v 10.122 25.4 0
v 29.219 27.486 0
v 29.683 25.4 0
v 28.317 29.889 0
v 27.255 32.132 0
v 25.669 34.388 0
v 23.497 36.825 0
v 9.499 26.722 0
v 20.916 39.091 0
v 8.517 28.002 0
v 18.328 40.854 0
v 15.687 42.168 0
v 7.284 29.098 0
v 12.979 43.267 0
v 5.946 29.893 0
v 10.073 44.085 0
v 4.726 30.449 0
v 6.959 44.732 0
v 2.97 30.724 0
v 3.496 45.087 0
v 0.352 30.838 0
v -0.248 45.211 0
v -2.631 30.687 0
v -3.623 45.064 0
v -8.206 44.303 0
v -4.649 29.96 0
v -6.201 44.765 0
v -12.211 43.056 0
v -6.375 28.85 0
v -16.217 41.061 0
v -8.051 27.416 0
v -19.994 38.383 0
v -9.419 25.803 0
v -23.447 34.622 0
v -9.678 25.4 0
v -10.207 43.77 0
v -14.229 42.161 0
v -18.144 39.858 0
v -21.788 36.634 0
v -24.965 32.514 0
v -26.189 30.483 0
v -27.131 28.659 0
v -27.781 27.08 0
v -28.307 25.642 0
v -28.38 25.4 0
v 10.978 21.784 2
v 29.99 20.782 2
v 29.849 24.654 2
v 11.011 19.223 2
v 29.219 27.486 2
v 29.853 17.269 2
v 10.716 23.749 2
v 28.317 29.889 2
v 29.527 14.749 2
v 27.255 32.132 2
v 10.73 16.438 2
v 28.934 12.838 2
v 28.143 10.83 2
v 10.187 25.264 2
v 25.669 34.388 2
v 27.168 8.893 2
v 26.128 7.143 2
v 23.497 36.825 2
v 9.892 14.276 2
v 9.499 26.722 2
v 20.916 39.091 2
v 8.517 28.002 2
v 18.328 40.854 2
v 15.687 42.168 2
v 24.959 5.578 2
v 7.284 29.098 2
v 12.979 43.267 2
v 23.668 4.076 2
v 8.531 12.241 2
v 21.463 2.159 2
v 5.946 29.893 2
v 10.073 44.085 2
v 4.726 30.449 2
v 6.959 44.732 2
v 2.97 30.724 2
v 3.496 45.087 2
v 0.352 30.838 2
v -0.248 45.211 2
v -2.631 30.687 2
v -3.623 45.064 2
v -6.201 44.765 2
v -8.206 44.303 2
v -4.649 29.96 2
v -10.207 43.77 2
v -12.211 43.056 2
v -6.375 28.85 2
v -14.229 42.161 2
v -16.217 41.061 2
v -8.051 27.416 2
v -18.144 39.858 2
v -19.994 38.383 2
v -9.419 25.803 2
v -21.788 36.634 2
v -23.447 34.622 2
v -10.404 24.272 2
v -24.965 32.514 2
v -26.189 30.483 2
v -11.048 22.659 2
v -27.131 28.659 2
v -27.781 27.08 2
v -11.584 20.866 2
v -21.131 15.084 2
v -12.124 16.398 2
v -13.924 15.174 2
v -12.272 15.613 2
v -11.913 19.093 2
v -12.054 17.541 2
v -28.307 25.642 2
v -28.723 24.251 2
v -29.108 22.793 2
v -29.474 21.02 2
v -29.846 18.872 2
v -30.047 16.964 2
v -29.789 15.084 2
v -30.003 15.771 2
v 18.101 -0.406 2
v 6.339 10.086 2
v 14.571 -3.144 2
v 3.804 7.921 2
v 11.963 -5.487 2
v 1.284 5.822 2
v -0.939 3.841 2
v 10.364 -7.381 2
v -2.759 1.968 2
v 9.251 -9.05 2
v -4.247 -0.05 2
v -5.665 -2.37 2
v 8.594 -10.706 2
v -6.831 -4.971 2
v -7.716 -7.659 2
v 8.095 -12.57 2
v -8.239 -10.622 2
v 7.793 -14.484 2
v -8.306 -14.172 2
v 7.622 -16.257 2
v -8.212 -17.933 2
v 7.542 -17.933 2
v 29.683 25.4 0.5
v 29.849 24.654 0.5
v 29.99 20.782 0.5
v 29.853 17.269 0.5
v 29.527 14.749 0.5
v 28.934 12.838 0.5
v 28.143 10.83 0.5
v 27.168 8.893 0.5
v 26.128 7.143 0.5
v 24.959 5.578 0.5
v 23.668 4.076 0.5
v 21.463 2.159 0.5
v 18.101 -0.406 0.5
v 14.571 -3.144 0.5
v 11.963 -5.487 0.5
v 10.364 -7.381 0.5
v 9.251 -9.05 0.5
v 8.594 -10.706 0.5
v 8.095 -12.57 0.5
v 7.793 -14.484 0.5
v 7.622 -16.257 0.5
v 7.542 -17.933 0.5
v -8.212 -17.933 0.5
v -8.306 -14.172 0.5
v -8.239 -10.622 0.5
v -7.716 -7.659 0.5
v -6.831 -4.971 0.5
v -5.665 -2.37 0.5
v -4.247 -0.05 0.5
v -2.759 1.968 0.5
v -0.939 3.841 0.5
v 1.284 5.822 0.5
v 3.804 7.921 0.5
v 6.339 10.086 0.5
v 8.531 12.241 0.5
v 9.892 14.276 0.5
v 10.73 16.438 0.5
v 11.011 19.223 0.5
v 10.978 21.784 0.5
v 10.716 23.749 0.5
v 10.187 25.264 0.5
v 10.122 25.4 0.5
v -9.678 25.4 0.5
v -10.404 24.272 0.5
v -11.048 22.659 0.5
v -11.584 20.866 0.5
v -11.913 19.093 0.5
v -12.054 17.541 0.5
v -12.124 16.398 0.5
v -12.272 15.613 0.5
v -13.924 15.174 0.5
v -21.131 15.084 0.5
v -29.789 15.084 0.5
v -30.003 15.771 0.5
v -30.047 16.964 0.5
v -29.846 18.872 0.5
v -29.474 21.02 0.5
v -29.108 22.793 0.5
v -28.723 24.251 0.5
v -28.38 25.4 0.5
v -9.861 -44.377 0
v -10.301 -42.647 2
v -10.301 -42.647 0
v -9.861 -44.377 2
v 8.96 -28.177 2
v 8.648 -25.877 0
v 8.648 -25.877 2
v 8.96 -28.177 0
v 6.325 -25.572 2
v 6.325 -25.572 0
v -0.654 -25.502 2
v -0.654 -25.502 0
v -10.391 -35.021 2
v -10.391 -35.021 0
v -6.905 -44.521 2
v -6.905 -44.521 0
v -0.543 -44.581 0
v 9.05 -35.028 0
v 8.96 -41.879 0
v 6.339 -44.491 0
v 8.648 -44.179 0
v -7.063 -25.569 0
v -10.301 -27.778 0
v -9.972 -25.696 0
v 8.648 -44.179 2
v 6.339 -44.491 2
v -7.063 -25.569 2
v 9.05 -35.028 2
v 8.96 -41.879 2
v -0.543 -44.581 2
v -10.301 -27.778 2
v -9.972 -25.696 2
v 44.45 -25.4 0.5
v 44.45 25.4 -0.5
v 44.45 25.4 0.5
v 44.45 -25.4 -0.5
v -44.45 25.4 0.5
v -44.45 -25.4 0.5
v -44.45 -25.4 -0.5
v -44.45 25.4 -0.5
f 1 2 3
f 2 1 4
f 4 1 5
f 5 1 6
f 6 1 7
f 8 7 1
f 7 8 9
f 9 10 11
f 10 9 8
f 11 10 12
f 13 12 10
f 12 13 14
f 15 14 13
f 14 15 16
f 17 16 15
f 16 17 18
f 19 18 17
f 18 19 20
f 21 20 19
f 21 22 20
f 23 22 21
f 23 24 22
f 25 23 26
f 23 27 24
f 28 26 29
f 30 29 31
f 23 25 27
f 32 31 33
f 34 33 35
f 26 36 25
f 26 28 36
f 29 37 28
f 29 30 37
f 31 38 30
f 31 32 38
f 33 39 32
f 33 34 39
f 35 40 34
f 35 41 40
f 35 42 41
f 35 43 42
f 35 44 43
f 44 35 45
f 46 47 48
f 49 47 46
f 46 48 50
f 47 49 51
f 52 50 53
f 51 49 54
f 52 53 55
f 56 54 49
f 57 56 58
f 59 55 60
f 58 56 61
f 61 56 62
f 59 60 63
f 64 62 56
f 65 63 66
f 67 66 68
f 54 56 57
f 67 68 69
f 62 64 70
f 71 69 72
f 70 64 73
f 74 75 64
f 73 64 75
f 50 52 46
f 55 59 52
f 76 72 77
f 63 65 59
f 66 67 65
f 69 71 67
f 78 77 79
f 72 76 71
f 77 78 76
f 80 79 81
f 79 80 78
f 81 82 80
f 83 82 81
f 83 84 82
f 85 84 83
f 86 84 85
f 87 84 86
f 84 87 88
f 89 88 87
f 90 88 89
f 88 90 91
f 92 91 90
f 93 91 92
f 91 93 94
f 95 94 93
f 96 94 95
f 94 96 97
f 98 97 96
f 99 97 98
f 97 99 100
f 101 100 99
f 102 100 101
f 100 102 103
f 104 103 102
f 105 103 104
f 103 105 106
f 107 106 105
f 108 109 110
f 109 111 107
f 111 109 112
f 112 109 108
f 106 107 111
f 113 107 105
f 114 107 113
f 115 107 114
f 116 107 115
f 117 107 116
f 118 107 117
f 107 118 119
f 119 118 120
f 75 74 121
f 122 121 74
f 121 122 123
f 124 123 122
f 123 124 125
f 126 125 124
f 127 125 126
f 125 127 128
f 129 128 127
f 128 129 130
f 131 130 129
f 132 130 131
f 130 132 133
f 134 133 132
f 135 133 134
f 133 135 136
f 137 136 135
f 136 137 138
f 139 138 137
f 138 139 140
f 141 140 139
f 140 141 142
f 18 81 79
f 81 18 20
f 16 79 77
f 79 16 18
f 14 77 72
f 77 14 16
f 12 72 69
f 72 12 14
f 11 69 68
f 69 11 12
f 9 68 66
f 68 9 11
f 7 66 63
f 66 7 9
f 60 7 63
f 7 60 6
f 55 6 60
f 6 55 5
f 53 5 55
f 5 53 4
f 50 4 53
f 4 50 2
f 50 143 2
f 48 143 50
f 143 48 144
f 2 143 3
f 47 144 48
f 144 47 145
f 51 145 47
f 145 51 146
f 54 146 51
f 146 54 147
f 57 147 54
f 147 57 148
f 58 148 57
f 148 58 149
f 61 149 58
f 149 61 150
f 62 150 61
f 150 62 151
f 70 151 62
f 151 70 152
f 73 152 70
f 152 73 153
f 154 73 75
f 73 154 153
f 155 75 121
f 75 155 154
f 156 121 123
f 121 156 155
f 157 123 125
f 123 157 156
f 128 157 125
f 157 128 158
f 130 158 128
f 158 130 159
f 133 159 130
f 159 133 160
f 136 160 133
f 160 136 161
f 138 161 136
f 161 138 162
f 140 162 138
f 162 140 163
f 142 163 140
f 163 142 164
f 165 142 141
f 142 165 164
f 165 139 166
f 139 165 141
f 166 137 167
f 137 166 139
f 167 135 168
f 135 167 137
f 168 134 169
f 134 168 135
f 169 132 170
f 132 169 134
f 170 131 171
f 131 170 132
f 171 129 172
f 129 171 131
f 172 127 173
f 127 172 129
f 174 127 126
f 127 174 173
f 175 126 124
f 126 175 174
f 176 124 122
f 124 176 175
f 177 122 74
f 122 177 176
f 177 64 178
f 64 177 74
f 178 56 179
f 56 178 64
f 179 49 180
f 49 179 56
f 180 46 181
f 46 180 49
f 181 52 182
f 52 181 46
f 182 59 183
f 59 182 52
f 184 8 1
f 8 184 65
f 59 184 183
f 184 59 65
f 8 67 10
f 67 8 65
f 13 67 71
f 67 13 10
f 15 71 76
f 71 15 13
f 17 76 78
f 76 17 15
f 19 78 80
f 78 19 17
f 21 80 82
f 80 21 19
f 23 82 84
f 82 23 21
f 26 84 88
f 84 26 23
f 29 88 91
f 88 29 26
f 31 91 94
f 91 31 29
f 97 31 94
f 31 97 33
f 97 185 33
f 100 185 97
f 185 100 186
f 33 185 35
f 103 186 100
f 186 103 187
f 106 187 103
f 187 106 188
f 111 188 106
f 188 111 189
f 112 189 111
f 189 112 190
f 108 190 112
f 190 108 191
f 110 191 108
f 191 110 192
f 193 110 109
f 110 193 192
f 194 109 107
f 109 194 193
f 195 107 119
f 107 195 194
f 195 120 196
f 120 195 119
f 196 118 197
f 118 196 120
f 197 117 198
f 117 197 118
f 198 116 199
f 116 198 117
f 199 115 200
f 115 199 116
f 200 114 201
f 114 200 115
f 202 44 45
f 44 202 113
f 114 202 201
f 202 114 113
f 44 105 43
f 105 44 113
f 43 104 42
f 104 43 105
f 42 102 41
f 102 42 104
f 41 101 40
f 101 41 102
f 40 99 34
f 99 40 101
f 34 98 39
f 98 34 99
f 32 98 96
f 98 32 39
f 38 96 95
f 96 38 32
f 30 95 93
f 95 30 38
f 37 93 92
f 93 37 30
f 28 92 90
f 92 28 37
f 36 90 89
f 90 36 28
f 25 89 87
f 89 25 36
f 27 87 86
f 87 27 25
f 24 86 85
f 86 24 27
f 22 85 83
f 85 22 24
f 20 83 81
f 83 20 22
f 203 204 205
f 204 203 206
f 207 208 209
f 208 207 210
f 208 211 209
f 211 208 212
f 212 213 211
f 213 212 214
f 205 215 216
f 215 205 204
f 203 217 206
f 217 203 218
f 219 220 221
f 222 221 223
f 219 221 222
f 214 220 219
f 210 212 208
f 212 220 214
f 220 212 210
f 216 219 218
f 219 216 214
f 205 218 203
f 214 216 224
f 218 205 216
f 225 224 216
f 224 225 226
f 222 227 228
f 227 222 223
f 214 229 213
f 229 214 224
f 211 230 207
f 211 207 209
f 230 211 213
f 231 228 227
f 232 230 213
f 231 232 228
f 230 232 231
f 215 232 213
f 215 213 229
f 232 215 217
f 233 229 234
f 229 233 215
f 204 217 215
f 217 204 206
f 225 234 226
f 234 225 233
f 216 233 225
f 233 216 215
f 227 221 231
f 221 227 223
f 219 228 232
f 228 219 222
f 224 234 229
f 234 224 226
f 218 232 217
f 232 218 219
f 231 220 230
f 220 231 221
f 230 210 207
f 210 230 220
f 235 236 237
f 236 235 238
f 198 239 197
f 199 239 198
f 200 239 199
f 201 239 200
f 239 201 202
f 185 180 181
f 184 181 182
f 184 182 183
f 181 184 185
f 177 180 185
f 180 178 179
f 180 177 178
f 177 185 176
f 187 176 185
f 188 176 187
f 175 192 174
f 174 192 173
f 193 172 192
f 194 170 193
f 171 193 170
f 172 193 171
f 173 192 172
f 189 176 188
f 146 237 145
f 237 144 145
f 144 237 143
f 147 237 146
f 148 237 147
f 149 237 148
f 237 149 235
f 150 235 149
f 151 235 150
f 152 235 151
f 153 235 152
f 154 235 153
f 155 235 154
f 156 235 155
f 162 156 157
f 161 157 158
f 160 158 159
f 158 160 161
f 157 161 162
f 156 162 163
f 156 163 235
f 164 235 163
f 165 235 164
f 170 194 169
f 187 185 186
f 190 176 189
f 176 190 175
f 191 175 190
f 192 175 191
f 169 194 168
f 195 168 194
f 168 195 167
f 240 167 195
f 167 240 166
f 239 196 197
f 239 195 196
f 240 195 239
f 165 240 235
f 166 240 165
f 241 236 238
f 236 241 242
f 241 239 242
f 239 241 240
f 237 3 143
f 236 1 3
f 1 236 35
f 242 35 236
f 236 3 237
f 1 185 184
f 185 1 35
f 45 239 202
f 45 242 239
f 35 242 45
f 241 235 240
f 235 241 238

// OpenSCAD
// [FL_INDEX: keywords="openscad, 3d_parametric, Customizable_Business_Card, csg_solid" | COT="Parametric OpenSCAD design from 3DCodeverse"]
// Title: Customizable Business Card

//------------------------------------------------------------
//	
//
//	input comes from:
//	http://chaaawa.com/stencil_factory/
//
//	
//	http://www.thingiverse.com/thing:55821
//------------------------------------------------------------

// preview[view:south, tilt:top]

// Go to: http://chaaawa.com/stencil_factory/, then paste here after "Convert&Copy".
input ="no_input";

stencil_thickness = 1;
stencil_width = 80;
margin = 10;

//If you don't want to center your design on the case
offX = 0;
offY = 0;
image_rotation =0; //[-180:180]

module void() {}

dispo_width = stencil_width - 2*margin;

points_array = (input=="no_input"? [[179,268],[[199.26,15.12],[189.19,15.56],[181.5,16.45],[175.52,17.83],[169.55,19.42],[163.57,21.55],[157.55,24.22],[151.62,27.5],[145.87,31.09],[140.35,35.49],[135,40.71],[130.05,46.71],[125.52,53],[121.87,59.06],[119.06,64.5],[117.12,69.21],[115.55,73.5],[114.31,77.65],[113.16,82],[112.07,87.29],[110.96,93.7],[110.36,99.39],[110.49,102.95],[111.13,105],[136.96,105],[158.46,104.73],[163.39,103.42],[163.83,101.08],[164.04,97.67],[164.46,93.04],[165.44,87.75],[167.04,82.4],[168.96,77.59],[171.9,73.02],[175.98,68.21],[180.98,63.93],[186.13,60.62],[192.15,58.45],[201.05,58],[208.86,58.34],[214.1,59.16],[217.74,60.82],[221.73,63.19],[225.41,66.46],[228.34,70.28],[230.39,74.63],[231.97,79.15],[232.75,85.01],[232.85,92.65],[232.01,100.96],[229.51,107.41],[225.45,113.48],[218.91,119.91],[211.35,126.37],[203.83,132.63],[197.2,138.54],[191.77,144.13],[187.33,150.15],[183.1,157.07],[179.62,164.83],[176.98,172.85],[175.42,181.69],[175.22,192.28],[175.5,203.5],[199,203.5],[222.5,203.5],[222.74,198.5],[223.25,193.21],[224.15,187.5],[225.64,181.94],[227.6,177],[230.92,172.02],[235.69,166.37],[243.47,159.38],[254,151.21],[264.03,143.56],[270.61,137.84],[274.46,133.36],[277.95,128.69],[281.05,123.47],[283.96,117.69],[286.32,111.7],[288.09,106],[289.06,98.48],[289.47,88],[289.05,76.45],[287.17,68],[284.48,60.83],[281.31,54.14],[276.58,47.41],[270.1,40.14],[262.4,33.38],[254.68,28.12],[246.8,24.2],[238.72,20.92],[230.05,18.48],[220.76,16.55],[210.43,15.49],[199.26,15.12]],[[198.05,226.08],[178.93,226.28],[170.25,226.66],[169.27,232.87],[169,254.48],[169.27,277.23],[170.58,282.39],[179.4,282.82],[198.38,283],[218.91,282.73],[225.8,281.8],[226.73,274.94],[227,254.5],[226.73,234.06],[225.8,227.2],[218.87,226.29],[198.05,226.08]]]: input);

input_width = points_array[0][0];
input_height= points_array[0][1];
sTrace = dispo_width/input_width;
stencil_height = input_height*sTrace + 2*margin;

cube([88.9,50.8,1], center=true);

difference() {
	translate([0, 0, stencil_thickness/2])
	translate([offX, offY, -stencil_thickness/2])
	rotate([0,0,image_rotation])
	scale([sTrace, -sTrace, 1])
	translate([-200, -150, 0]) {
		union() {
			for (i = [1:len(points_array) -1] ) {
				linear_extrude(height=stencil_thickness*2) {polygon(points_array[i]);}
			}
		}
	}
}
